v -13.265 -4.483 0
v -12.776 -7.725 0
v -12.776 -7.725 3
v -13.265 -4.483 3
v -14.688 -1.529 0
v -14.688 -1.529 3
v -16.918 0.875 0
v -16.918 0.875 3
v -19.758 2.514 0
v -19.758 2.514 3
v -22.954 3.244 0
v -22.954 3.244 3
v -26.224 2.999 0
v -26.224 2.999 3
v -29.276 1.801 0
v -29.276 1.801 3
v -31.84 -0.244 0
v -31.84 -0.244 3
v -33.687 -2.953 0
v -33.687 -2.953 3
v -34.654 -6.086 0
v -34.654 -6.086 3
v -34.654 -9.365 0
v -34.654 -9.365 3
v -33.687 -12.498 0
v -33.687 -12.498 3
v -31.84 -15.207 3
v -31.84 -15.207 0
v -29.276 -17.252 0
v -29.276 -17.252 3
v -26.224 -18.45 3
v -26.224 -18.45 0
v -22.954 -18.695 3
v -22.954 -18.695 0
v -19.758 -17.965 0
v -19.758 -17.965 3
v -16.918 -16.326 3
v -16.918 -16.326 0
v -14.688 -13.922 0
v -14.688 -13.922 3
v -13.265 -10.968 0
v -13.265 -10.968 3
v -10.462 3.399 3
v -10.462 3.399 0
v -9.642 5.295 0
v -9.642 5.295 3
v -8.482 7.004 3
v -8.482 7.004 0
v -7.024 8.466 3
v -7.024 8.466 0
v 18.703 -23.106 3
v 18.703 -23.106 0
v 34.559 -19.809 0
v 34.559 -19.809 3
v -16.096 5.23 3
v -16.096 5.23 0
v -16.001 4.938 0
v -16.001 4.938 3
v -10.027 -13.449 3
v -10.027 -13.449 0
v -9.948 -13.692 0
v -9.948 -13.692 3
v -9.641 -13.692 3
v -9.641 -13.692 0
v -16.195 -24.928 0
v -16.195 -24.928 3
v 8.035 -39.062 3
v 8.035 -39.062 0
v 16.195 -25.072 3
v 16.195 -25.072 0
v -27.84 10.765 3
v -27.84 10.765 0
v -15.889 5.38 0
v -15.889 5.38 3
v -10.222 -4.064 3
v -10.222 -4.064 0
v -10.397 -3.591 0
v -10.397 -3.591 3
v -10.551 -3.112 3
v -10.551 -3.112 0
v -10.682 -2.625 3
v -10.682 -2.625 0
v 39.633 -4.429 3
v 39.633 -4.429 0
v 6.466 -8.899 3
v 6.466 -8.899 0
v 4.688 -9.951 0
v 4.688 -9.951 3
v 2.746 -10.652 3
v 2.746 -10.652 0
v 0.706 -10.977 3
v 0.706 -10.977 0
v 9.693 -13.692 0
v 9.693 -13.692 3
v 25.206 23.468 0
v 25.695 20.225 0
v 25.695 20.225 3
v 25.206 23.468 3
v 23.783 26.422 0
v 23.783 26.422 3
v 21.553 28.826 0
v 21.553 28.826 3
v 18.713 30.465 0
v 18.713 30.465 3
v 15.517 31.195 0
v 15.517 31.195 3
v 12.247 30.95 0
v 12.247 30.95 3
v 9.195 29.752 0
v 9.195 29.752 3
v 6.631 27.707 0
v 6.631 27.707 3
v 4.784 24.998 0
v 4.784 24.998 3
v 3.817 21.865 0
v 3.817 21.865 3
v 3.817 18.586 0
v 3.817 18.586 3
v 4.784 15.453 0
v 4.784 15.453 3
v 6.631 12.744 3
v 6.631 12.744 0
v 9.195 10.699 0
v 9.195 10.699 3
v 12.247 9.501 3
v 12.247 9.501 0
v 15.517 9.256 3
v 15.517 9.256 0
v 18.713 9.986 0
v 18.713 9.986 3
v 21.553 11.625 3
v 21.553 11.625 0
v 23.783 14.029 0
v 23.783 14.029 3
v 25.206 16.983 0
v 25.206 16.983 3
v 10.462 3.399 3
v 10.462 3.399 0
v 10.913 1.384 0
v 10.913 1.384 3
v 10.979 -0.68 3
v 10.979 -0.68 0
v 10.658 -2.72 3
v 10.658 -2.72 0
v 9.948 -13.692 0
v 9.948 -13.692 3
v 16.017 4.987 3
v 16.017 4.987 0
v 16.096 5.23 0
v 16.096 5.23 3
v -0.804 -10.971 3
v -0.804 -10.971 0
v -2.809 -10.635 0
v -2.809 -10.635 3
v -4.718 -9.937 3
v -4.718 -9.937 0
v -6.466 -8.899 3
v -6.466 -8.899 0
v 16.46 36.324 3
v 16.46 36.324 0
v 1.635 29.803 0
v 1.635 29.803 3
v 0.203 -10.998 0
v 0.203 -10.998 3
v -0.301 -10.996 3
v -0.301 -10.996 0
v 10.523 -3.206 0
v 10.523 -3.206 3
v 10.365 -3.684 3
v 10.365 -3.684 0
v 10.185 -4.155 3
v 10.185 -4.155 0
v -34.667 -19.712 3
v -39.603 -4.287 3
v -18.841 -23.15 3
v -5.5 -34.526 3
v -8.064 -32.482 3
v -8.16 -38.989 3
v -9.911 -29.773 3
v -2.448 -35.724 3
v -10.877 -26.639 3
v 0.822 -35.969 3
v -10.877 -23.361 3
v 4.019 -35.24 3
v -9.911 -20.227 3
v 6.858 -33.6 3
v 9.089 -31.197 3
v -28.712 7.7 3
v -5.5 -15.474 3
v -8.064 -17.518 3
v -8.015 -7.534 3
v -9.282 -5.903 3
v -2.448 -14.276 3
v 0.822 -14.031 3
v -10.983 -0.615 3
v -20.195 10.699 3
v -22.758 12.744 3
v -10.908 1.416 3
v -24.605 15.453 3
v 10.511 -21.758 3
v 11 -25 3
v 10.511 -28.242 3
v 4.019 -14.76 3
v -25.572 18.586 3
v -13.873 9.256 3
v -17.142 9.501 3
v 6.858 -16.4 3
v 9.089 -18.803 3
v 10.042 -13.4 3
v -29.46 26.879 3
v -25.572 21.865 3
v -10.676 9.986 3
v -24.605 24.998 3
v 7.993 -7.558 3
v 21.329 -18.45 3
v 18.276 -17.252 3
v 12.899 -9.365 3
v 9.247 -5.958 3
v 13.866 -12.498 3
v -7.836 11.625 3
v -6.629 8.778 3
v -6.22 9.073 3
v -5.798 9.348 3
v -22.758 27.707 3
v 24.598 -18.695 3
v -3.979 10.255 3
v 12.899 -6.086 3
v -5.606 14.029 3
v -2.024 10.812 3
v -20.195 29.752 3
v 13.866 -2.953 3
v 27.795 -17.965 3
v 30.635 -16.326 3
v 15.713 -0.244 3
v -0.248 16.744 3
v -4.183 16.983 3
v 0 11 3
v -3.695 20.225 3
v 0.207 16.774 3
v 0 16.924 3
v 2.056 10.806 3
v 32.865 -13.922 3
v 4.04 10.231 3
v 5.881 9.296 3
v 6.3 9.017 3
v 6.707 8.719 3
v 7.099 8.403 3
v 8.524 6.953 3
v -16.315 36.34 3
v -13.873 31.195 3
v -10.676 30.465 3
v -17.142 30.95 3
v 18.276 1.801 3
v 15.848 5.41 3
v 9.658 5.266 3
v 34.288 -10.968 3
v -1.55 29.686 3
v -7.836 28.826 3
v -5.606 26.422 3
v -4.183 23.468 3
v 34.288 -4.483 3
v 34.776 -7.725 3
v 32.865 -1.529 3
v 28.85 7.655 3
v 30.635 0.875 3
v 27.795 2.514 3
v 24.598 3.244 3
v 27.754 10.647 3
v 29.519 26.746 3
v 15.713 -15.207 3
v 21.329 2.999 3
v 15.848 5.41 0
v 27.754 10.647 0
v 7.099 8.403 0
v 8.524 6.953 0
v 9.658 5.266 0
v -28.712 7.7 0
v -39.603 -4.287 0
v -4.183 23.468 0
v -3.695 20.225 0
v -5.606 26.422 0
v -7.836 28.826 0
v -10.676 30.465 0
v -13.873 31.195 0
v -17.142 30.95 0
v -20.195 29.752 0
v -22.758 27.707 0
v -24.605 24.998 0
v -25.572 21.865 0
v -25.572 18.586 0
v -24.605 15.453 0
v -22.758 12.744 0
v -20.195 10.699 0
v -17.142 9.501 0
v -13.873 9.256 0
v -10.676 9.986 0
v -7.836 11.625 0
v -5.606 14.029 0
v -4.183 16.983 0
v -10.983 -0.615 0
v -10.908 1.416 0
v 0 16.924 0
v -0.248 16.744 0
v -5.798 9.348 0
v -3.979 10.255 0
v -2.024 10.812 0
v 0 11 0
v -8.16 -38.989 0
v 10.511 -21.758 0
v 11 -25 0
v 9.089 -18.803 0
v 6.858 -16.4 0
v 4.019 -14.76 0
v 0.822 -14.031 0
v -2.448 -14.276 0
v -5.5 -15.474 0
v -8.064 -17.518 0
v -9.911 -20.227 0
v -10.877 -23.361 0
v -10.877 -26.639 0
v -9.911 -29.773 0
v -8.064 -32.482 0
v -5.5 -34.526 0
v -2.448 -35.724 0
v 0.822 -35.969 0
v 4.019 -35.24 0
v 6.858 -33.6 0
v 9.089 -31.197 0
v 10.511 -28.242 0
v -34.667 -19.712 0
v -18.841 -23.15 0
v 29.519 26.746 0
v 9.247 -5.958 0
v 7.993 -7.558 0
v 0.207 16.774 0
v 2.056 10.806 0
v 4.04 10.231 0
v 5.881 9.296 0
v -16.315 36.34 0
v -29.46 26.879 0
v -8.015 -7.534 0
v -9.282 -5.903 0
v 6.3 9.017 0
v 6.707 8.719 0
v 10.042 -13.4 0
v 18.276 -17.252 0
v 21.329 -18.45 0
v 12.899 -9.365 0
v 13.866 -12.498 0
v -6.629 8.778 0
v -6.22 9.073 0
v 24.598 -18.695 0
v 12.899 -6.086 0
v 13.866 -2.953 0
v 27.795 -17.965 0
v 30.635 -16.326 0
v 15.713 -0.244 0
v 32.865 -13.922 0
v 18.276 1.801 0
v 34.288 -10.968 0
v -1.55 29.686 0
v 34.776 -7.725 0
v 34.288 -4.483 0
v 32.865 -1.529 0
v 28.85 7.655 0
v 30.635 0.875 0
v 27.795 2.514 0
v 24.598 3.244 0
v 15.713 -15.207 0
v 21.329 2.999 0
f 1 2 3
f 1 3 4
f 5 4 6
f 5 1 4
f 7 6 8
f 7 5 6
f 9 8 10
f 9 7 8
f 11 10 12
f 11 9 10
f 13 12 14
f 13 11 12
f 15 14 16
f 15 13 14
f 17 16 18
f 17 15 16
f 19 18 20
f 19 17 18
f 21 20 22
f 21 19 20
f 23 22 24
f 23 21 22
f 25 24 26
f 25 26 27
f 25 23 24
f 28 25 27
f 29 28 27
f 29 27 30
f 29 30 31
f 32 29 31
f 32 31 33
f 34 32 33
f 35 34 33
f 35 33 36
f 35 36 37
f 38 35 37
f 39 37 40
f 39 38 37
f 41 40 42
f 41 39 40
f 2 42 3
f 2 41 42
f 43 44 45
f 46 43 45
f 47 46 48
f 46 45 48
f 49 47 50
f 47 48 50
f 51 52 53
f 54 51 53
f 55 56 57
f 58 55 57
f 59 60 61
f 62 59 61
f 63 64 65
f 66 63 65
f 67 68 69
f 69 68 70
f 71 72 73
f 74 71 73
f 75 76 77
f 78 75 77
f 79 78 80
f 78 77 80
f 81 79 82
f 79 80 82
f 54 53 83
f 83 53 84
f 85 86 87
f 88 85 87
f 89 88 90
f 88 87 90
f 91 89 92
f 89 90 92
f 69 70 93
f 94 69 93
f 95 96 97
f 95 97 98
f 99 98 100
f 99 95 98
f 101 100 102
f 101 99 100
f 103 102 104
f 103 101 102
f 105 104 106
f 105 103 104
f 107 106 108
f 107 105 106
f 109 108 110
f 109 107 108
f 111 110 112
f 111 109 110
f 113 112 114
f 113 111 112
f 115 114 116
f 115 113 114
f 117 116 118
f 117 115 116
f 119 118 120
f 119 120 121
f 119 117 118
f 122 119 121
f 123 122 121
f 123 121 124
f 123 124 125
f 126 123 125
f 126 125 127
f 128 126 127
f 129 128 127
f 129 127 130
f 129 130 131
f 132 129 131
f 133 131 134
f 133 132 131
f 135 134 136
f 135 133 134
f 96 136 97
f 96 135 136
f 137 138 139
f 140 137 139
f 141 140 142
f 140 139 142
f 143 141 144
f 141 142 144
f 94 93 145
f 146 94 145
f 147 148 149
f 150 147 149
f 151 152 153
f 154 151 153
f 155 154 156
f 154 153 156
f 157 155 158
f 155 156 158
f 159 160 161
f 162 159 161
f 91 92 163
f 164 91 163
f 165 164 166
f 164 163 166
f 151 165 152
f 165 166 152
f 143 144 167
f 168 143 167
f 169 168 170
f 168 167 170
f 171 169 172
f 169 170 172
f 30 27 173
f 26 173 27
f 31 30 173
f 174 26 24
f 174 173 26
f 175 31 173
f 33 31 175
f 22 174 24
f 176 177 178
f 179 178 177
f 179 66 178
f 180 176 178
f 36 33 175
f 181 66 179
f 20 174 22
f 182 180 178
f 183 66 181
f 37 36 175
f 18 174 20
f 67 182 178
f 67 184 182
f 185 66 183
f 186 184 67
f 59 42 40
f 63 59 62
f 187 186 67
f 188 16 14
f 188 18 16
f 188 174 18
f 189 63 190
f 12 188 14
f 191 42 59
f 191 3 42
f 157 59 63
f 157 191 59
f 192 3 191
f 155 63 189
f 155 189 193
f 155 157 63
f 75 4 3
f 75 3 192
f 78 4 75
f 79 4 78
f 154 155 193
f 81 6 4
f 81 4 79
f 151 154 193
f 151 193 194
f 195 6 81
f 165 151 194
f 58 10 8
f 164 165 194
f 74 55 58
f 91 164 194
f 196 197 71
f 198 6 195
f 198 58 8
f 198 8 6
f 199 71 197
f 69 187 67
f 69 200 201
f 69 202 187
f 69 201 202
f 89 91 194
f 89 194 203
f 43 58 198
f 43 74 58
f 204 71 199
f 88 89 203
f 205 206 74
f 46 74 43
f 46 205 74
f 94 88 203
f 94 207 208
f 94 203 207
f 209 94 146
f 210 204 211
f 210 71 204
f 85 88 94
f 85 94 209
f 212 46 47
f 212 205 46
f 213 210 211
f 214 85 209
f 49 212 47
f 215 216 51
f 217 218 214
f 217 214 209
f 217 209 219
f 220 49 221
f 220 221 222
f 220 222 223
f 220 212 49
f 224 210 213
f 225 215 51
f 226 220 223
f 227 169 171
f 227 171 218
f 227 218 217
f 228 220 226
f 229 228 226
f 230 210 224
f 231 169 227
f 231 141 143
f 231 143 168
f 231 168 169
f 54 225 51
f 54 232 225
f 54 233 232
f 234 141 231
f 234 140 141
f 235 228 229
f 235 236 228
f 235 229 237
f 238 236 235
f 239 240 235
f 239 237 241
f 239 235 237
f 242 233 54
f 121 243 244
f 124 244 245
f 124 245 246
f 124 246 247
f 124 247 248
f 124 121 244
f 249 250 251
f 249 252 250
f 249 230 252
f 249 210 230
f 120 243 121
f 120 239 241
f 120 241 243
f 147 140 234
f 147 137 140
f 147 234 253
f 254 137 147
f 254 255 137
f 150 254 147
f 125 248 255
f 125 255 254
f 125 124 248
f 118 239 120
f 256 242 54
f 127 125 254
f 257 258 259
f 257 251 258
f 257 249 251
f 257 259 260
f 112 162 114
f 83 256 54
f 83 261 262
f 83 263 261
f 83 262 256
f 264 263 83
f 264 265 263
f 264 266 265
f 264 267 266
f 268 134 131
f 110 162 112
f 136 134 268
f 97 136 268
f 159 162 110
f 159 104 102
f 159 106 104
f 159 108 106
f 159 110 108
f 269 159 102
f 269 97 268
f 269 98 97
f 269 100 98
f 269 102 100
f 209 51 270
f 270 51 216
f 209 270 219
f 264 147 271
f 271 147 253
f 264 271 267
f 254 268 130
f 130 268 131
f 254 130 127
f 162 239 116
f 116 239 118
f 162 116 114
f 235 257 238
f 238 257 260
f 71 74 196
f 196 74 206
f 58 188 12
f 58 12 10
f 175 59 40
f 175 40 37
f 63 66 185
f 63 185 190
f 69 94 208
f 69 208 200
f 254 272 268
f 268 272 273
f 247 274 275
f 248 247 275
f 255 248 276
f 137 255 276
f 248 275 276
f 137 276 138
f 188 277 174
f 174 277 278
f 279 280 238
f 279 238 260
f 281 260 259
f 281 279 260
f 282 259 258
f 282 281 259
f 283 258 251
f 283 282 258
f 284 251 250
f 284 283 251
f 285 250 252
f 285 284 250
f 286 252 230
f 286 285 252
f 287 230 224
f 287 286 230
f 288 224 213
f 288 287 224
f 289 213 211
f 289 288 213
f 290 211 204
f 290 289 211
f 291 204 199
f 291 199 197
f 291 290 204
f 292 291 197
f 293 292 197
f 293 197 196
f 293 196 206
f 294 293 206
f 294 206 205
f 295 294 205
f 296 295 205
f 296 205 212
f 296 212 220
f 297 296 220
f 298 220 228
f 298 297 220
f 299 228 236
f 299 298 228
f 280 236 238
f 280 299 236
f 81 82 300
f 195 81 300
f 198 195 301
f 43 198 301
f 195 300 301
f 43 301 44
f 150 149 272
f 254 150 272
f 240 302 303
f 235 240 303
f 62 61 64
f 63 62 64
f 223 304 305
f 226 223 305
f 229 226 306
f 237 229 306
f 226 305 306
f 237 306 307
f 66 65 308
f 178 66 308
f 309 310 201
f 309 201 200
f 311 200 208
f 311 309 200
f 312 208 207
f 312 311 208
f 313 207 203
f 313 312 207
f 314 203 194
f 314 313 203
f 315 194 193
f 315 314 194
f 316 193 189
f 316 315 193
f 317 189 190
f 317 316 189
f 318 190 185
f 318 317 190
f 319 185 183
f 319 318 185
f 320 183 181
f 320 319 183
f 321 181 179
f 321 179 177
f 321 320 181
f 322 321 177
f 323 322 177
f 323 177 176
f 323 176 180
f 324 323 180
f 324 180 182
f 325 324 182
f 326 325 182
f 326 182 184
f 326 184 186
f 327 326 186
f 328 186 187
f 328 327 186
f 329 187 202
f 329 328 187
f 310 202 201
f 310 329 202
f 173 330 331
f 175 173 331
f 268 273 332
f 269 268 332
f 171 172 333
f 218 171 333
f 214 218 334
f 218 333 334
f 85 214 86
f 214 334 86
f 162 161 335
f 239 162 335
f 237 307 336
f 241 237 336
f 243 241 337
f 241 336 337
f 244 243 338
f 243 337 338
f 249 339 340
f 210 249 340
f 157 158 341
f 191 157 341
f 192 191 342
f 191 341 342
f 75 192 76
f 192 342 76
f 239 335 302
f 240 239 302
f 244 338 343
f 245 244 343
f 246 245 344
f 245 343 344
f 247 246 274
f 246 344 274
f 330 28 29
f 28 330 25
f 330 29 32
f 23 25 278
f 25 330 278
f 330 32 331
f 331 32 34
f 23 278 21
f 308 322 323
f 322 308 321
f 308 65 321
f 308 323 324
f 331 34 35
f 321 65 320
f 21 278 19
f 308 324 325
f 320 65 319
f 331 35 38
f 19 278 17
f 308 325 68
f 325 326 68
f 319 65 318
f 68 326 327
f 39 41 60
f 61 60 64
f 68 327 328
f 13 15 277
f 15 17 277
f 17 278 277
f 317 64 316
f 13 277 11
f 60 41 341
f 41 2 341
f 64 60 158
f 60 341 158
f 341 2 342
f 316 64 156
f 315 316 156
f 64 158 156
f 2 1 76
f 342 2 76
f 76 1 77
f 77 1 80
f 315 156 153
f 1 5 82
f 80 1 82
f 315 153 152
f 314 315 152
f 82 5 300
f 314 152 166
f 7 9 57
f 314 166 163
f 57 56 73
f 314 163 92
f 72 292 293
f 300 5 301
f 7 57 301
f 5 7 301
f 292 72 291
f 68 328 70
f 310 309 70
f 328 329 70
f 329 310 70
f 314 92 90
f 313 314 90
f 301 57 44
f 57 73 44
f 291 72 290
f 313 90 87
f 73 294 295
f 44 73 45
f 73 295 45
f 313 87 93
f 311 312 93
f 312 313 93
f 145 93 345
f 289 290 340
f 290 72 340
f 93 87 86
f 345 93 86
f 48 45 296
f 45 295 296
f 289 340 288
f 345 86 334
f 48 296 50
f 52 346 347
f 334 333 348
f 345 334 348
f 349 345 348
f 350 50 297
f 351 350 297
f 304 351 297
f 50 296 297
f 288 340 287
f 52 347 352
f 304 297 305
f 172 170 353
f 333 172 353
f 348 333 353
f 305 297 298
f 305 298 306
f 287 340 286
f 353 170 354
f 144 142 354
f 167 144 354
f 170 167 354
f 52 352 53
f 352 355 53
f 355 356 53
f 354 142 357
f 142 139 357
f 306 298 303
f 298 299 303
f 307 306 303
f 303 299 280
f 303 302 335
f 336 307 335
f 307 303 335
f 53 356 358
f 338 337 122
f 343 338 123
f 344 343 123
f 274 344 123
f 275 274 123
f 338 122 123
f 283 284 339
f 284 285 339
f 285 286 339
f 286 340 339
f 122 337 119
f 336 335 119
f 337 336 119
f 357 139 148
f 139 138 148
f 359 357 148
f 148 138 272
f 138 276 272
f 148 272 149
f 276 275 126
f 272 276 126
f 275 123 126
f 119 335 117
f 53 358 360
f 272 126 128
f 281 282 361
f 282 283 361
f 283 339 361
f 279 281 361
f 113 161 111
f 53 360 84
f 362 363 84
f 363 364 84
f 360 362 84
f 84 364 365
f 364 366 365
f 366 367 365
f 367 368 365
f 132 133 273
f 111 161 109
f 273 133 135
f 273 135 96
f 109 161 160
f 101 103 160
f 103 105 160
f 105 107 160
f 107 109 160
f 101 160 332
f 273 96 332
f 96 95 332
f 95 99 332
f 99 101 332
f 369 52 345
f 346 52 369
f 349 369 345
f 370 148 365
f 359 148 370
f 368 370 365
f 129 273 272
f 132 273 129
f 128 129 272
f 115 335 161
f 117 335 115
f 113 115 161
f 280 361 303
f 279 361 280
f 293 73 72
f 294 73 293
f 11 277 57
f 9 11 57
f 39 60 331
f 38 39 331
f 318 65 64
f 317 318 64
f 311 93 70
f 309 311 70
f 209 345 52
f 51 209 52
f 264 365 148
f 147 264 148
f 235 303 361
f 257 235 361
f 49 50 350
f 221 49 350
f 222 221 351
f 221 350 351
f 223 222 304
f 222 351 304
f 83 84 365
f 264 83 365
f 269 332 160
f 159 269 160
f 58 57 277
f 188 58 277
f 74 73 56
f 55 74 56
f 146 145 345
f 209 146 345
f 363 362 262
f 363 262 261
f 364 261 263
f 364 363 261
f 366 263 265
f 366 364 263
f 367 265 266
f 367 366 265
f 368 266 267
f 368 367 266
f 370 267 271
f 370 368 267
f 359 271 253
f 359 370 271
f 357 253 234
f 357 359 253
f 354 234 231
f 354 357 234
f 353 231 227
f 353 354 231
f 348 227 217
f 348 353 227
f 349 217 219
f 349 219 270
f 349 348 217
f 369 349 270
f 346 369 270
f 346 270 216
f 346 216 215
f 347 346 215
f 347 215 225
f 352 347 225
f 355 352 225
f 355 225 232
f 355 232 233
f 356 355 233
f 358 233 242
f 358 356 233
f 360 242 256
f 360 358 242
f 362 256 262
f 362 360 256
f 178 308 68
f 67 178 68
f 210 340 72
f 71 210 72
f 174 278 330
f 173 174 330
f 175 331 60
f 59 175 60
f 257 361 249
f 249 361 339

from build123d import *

# Parameters (mm, degrees)
F0_R     = 11
F1_DEPTH = 3


with BuildPart() as f1:
    # F0 (on Top) → F1 (new body)
    with BuildSketch(Plane.XY):
        Polygon((9.692502, -13.691952), (9.947785, -13.691952), (10.0425, -13.400449), (18.702897, -23.105726), (34.559387, -19.809369), (39.632903, -4.429067), (28.849928, 7.654877), (16.016968, 4.987071), (16.095854, 5.22986), (15.847887, 5.410019), (27.754365, 10.64745), (29.519267, 26.746499), (16.459534, 36.324473), (1.634898, 29.803399), (0.206528, 16.774131), (0, 16.924183), (-0.247967, 16.744024), (-1.549757, 29.686213), (-16.315477, 36.339614), (-29.460351, 26.878826), (-27.839506, 10.764637), (-15.889326, 5.379912), (-16.095854, 5.22986), (-16.001139, 4.938357), (-28.712167, 7.699638), (-39.602786, -4.287382), (-34.667032, -19.712445), (-18.840659, -23.150488), (-10.026672, -13.449163), (-9.947785, -13.691952), (-9.641281, -13.691952), (-16.195339, -24.927575), (-8.160391, -38.989362), (8.034947, -39.061787), (16.195339, -25.072425), align=None)
        with Locations((0, -25)):
            Circle(F0_R, mode=Mode.SUBTRACT)
        with Locations((-23.776413, -7.725425)):
            Circle(F0_R, mode=Mode.SUBTRACT)
        with Locations((23.776413, -7.725425)):
            Circle(F0_R, mode=Mode.SUBTRACT)
        with BuildLine():
            ThreePointArc((-0.804417, -10.970548), (-3.77969, -10.330244), (-6.465638, -8.899187))
            ThreePointArc((-6.465638, -8.899187), (-8.686922, -6.74814), (-10.221788, -4.063872))
            ThreePointArc((-10.221788, -4.063872), (-10.476718, -3.352369), (-10.682189, -2.62504))
            ThreePointArc((-10.682189, -2.62504), (-10.992634, 0.402478), (-10.461622, 3.399187))
            ThreePointArc((-10.461622, 3.399187), (-9.102269, 6.176464), (-7.023678, 8.465692))
            ThreePointArc((-7.023678, 8.465692), (-6.425776, 8.928012), (-5.797539, 9.348184))
            ThreePointArc((-5.797539, 9.348184), (-3.014132, 10.578989), (0, 11))
            ThreePointArc((0, 11), (3.06141, 10.565404), (5.880916, 9.295958))
            ThreePointArc((5.880916, 9.295958), (6.50537, 8.870184), (7.099113, 8.402535))
            ThreePointArc((7.099113, 8.402535), (9.129799, 6.135697), (10.461622, 3.399187))
            ThreePointArc((10.461622, 3.399187), (10.994324, 0.353315), (10.658284, -2.720474))
            ThreePointArc((10.658284, -2.720474), (10.446316, -3.445937), (10.185032, -4.155131))
            ThreePointArc((10.185032, -4.155131), (8.656658, -6.78692), (6.465638, -8.899187))
            ThreePointArc((6.465638, -8.899187), (3.733456, -10.347043), (0.706266, -10.977303))
            ThreePointArc((0.706266, -10.977303), (-0.049191, -10.99989), (-0.804417, -10.970548))
        make_face(mode=Mode.SUBTRACT)
        with Locations((-14.694631, 20.225425)):
            Circle(F0_R, mode=Mode.SUBTRACT)
        with Locations((14.694631, 20.225425)):
            Circle(F0_R, mode=Mode.SUBTRACT)
    extrude(amount=F1_DEPTH)


solid = f1.part
